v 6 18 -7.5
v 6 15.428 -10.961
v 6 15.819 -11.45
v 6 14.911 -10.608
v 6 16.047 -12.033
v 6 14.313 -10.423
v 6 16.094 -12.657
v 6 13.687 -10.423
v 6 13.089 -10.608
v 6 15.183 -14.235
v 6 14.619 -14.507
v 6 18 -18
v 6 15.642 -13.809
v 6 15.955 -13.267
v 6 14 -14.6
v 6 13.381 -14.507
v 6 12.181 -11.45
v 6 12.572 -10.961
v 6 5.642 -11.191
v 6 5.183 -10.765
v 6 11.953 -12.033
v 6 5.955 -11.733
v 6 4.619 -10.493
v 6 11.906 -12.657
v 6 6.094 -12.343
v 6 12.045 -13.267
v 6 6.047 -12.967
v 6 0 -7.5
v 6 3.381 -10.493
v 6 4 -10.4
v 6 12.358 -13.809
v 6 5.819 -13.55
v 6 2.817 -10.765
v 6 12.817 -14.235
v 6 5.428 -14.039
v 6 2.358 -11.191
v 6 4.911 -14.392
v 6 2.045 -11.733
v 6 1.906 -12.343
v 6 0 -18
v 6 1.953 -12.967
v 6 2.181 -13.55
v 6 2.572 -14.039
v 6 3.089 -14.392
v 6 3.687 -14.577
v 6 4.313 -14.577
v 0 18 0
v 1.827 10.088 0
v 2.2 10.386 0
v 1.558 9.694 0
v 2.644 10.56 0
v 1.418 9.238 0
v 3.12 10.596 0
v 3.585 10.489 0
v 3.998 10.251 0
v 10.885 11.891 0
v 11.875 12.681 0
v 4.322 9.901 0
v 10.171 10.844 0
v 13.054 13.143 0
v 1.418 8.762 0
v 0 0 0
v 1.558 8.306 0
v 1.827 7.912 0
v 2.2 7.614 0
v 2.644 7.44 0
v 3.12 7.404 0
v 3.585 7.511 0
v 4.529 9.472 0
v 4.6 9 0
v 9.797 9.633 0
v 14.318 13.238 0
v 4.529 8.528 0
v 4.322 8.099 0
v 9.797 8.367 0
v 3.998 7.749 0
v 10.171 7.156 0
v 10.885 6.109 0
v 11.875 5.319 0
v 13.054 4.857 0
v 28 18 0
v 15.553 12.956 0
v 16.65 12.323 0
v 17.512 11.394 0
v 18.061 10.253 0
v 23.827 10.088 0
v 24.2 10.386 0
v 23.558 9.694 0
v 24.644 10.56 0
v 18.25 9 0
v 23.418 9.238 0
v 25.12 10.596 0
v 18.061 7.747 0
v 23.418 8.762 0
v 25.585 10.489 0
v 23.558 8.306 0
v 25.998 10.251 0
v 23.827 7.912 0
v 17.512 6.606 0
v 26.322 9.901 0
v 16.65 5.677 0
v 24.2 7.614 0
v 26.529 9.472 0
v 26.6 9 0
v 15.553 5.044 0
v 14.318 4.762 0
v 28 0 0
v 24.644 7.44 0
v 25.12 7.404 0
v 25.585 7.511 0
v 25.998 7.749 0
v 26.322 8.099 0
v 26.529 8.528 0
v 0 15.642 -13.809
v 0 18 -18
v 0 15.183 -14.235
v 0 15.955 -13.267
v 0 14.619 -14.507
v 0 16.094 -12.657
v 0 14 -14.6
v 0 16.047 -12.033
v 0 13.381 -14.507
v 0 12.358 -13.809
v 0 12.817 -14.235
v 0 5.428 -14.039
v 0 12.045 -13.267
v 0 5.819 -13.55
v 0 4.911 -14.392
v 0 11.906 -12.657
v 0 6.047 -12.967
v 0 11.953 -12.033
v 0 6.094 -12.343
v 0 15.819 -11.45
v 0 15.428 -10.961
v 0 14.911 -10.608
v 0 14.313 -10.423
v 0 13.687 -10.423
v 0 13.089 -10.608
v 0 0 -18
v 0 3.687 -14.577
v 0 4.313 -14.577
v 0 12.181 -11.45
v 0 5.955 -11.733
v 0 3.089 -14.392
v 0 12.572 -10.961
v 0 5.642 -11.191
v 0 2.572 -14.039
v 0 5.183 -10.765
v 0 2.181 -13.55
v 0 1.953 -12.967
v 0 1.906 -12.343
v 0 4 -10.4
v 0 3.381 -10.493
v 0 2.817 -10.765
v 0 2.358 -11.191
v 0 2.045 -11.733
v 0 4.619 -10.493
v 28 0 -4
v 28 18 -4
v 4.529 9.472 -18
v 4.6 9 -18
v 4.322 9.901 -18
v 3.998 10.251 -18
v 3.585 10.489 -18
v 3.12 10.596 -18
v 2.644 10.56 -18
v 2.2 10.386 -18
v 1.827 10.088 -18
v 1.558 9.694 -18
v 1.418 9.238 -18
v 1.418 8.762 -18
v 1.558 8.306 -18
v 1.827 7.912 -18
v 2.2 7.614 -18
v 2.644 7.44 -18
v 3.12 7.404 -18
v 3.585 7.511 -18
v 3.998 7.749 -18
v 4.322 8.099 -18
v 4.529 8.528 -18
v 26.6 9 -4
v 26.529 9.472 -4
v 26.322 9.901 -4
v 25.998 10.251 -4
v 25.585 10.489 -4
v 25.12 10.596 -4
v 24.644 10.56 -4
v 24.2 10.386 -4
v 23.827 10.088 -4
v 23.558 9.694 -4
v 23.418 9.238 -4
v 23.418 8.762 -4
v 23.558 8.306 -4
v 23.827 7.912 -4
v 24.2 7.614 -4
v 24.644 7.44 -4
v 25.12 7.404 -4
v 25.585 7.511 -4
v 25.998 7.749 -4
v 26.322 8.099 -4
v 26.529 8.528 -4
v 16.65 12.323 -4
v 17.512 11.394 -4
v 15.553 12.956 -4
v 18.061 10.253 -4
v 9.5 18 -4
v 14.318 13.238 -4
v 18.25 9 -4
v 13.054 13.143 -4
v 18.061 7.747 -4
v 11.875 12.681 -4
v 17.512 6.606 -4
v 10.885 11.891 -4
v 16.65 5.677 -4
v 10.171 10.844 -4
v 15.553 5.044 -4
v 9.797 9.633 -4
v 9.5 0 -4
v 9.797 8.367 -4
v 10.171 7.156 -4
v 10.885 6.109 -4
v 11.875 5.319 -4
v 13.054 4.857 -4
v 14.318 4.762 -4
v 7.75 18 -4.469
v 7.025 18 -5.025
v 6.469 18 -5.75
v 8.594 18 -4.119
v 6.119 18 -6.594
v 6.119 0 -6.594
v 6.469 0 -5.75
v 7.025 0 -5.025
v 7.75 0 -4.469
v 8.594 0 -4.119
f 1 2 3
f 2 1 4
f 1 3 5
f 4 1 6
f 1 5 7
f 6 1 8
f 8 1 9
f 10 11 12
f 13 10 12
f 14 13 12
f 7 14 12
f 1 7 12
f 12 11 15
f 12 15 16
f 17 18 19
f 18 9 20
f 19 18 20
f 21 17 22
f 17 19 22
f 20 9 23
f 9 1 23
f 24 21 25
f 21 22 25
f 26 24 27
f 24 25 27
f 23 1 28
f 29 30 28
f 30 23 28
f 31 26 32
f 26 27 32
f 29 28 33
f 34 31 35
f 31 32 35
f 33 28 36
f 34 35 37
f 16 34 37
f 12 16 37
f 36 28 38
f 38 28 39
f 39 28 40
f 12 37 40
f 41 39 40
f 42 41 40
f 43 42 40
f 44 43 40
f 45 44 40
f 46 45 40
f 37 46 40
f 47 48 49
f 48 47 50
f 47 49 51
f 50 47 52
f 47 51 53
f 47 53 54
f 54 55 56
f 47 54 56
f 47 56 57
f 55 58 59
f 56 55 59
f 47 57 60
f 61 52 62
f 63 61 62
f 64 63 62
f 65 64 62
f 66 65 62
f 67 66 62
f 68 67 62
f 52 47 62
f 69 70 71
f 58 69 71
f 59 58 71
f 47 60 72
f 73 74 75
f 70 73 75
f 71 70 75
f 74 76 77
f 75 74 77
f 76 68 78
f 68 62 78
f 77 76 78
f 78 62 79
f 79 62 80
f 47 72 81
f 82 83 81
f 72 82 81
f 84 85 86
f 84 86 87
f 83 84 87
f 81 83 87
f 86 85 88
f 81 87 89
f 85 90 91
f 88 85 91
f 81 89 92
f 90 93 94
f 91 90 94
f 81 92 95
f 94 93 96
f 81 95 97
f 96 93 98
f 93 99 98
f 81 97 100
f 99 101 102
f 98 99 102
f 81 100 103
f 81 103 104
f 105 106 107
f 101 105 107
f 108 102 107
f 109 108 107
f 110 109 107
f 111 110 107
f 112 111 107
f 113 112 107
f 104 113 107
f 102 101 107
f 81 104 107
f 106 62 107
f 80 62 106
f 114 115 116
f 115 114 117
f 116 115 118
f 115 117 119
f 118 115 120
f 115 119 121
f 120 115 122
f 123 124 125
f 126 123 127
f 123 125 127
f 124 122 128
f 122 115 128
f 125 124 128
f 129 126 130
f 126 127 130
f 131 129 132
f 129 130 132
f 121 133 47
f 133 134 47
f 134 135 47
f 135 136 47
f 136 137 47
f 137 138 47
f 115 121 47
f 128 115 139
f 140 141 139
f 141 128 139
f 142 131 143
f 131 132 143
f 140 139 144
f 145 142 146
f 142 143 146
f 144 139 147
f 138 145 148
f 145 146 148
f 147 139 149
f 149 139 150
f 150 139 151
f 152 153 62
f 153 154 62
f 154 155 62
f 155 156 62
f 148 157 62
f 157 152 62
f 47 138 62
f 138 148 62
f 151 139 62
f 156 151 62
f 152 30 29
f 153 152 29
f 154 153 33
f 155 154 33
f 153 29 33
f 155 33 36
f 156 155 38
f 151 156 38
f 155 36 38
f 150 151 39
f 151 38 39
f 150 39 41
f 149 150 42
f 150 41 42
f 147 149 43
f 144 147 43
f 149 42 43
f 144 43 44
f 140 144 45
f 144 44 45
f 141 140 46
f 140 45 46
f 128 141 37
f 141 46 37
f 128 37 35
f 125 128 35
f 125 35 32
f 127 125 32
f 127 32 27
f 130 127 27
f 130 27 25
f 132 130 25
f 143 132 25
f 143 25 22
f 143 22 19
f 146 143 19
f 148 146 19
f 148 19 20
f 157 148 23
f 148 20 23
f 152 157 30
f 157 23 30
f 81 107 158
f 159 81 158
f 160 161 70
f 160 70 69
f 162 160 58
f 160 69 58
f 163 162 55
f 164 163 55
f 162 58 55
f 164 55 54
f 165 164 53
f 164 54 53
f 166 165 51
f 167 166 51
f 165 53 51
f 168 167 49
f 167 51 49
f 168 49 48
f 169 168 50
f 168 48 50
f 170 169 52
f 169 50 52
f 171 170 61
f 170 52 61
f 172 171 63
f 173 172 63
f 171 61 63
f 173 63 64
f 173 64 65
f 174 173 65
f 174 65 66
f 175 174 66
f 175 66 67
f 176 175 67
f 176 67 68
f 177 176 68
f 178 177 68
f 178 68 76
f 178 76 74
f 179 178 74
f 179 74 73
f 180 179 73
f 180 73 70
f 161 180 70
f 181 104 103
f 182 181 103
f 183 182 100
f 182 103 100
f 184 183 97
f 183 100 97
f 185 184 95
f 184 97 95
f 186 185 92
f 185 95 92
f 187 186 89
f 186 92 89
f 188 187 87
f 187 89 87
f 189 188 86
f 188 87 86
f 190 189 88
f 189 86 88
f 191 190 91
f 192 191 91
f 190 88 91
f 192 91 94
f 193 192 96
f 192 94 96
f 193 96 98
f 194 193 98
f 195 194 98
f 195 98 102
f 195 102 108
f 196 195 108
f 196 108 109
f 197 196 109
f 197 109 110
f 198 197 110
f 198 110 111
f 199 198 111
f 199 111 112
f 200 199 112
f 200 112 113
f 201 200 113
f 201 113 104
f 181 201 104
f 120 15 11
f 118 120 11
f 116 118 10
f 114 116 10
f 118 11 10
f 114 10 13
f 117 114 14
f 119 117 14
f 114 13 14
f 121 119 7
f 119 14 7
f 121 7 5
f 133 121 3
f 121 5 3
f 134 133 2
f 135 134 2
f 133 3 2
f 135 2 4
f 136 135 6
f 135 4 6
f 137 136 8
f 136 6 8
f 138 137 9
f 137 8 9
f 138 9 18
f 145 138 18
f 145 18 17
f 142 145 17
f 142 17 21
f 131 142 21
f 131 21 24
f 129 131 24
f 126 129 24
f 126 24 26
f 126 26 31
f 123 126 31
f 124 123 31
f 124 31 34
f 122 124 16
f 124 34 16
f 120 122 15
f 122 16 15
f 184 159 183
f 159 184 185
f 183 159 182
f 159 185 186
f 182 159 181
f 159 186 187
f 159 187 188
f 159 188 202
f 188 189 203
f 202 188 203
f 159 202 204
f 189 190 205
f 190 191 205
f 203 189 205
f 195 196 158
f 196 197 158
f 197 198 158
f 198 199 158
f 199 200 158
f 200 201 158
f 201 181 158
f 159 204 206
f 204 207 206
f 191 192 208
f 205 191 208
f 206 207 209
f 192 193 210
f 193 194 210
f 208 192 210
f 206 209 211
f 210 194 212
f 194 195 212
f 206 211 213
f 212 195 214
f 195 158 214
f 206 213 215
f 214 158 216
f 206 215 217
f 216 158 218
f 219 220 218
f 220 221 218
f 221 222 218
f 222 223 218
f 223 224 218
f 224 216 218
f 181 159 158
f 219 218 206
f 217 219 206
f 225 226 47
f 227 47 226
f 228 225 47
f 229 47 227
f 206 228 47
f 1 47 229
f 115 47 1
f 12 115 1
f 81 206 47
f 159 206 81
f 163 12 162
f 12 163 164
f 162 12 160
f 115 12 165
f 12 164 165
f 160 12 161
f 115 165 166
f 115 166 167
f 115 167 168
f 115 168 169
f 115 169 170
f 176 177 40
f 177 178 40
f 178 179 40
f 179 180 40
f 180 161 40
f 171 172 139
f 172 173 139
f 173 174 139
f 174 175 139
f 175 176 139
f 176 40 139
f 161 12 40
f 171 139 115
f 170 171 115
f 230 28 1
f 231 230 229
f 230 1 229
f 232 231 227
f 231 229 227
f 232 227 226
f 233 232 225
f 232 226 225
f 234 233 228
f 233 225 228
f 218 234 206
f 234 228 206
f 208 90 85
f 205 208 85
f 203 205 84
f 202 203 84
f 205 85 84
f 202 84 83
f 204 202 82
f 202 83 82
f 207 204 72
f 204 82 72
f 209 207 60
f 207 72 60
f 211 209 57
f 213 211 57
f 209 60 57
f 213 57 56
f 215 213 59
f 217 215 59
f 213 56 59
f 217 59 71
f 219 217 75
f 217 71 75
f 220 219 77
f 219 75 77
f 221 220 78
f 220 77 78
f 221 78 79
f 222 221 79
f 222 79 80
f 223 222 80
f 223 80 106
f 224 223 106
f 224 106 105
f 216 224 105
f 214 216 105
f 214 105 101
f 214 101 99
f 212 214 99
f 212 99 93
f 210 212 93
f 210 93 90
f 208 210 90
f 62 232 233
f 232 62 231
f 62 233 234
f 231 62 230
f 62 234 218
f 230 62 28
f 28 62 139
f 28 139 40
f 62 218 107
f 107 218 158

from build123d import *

# Parameters (mm, degrees)
BOSS_EXTRUDE1_DEPTH = 18
SKETCH4_R           = 1.6
CUT_EXTRUDE2_DEPTH  = 38.841775857
FILLET1_R           = 3.5
SKETCH7_R           = 2.1
CUT_EXTRUDE5_DEPTH  = 6
SKETCH8_R           = 4.25
CUT_EXTRUDE6_DEPTH  = 38.841775857


with BuildPart() as part:
    # Sketch1 → Boss-Extrude1 (new body)
    with BuildSketch(Plane(origin=(0, 0, 0), x_dir=(1, 0, 0), z_dir=(0, 1, 0))):
        Polygon((0, 18), (0, 0), (28, 0), (28, 4), (6, 4), (6, 18), align=None)
    extrude(amount=BOSS_EXTRUDE1_DEPTH)

    # Sketch4 → Cut-Extrude2 (cut, through all)
    with BuildSketch(Plane.XY):
        with Locations((25, 9)):
            Circle(SKETCH4_R)
        with Locations((3, 9)):
            Circle(SKETCH4_R)
    extrude(amount=-CUT_EXTRUDE2_DEPTH, mode=Mode.SUBTRACT)

    # Fillet1
    fillet1_edges = [part.edges().sort_by_distance(p)[0] for p in [
        (6, 9, -4),
    ]]
    fillet(fillet1_edges, radius=FILLET1_R)

    # Sketch7 → Cut-Extrude5 (cut)
    with BuildSketch(Plane(origin=(6, 0, 0), x_dir=(0, 0, -1), z_dir=(1, 0, 0))):
        with Locations((12.5, 14)):
            Circle(SKETCH7_R)
        with Locations(Location((12.5, 4, 0), (0, 0, 180))):
            Circle(SKETCH7_R)
    extrude(amount=-CUT_EXTRUDE5_DEPTH, mode=Mode.SUBTRACT)

    # Sketch8 → Cut-Extrude6 (cut, through all)
    with BuildSketch(Plane.XY):
        with Locations((14, 9)):
            Circle(SKETCH8_R)
    extrude(amount=-CUT_EXTRUDE6_DEPTH, mode=Mode.SUBTRACT)


solid = part.part
